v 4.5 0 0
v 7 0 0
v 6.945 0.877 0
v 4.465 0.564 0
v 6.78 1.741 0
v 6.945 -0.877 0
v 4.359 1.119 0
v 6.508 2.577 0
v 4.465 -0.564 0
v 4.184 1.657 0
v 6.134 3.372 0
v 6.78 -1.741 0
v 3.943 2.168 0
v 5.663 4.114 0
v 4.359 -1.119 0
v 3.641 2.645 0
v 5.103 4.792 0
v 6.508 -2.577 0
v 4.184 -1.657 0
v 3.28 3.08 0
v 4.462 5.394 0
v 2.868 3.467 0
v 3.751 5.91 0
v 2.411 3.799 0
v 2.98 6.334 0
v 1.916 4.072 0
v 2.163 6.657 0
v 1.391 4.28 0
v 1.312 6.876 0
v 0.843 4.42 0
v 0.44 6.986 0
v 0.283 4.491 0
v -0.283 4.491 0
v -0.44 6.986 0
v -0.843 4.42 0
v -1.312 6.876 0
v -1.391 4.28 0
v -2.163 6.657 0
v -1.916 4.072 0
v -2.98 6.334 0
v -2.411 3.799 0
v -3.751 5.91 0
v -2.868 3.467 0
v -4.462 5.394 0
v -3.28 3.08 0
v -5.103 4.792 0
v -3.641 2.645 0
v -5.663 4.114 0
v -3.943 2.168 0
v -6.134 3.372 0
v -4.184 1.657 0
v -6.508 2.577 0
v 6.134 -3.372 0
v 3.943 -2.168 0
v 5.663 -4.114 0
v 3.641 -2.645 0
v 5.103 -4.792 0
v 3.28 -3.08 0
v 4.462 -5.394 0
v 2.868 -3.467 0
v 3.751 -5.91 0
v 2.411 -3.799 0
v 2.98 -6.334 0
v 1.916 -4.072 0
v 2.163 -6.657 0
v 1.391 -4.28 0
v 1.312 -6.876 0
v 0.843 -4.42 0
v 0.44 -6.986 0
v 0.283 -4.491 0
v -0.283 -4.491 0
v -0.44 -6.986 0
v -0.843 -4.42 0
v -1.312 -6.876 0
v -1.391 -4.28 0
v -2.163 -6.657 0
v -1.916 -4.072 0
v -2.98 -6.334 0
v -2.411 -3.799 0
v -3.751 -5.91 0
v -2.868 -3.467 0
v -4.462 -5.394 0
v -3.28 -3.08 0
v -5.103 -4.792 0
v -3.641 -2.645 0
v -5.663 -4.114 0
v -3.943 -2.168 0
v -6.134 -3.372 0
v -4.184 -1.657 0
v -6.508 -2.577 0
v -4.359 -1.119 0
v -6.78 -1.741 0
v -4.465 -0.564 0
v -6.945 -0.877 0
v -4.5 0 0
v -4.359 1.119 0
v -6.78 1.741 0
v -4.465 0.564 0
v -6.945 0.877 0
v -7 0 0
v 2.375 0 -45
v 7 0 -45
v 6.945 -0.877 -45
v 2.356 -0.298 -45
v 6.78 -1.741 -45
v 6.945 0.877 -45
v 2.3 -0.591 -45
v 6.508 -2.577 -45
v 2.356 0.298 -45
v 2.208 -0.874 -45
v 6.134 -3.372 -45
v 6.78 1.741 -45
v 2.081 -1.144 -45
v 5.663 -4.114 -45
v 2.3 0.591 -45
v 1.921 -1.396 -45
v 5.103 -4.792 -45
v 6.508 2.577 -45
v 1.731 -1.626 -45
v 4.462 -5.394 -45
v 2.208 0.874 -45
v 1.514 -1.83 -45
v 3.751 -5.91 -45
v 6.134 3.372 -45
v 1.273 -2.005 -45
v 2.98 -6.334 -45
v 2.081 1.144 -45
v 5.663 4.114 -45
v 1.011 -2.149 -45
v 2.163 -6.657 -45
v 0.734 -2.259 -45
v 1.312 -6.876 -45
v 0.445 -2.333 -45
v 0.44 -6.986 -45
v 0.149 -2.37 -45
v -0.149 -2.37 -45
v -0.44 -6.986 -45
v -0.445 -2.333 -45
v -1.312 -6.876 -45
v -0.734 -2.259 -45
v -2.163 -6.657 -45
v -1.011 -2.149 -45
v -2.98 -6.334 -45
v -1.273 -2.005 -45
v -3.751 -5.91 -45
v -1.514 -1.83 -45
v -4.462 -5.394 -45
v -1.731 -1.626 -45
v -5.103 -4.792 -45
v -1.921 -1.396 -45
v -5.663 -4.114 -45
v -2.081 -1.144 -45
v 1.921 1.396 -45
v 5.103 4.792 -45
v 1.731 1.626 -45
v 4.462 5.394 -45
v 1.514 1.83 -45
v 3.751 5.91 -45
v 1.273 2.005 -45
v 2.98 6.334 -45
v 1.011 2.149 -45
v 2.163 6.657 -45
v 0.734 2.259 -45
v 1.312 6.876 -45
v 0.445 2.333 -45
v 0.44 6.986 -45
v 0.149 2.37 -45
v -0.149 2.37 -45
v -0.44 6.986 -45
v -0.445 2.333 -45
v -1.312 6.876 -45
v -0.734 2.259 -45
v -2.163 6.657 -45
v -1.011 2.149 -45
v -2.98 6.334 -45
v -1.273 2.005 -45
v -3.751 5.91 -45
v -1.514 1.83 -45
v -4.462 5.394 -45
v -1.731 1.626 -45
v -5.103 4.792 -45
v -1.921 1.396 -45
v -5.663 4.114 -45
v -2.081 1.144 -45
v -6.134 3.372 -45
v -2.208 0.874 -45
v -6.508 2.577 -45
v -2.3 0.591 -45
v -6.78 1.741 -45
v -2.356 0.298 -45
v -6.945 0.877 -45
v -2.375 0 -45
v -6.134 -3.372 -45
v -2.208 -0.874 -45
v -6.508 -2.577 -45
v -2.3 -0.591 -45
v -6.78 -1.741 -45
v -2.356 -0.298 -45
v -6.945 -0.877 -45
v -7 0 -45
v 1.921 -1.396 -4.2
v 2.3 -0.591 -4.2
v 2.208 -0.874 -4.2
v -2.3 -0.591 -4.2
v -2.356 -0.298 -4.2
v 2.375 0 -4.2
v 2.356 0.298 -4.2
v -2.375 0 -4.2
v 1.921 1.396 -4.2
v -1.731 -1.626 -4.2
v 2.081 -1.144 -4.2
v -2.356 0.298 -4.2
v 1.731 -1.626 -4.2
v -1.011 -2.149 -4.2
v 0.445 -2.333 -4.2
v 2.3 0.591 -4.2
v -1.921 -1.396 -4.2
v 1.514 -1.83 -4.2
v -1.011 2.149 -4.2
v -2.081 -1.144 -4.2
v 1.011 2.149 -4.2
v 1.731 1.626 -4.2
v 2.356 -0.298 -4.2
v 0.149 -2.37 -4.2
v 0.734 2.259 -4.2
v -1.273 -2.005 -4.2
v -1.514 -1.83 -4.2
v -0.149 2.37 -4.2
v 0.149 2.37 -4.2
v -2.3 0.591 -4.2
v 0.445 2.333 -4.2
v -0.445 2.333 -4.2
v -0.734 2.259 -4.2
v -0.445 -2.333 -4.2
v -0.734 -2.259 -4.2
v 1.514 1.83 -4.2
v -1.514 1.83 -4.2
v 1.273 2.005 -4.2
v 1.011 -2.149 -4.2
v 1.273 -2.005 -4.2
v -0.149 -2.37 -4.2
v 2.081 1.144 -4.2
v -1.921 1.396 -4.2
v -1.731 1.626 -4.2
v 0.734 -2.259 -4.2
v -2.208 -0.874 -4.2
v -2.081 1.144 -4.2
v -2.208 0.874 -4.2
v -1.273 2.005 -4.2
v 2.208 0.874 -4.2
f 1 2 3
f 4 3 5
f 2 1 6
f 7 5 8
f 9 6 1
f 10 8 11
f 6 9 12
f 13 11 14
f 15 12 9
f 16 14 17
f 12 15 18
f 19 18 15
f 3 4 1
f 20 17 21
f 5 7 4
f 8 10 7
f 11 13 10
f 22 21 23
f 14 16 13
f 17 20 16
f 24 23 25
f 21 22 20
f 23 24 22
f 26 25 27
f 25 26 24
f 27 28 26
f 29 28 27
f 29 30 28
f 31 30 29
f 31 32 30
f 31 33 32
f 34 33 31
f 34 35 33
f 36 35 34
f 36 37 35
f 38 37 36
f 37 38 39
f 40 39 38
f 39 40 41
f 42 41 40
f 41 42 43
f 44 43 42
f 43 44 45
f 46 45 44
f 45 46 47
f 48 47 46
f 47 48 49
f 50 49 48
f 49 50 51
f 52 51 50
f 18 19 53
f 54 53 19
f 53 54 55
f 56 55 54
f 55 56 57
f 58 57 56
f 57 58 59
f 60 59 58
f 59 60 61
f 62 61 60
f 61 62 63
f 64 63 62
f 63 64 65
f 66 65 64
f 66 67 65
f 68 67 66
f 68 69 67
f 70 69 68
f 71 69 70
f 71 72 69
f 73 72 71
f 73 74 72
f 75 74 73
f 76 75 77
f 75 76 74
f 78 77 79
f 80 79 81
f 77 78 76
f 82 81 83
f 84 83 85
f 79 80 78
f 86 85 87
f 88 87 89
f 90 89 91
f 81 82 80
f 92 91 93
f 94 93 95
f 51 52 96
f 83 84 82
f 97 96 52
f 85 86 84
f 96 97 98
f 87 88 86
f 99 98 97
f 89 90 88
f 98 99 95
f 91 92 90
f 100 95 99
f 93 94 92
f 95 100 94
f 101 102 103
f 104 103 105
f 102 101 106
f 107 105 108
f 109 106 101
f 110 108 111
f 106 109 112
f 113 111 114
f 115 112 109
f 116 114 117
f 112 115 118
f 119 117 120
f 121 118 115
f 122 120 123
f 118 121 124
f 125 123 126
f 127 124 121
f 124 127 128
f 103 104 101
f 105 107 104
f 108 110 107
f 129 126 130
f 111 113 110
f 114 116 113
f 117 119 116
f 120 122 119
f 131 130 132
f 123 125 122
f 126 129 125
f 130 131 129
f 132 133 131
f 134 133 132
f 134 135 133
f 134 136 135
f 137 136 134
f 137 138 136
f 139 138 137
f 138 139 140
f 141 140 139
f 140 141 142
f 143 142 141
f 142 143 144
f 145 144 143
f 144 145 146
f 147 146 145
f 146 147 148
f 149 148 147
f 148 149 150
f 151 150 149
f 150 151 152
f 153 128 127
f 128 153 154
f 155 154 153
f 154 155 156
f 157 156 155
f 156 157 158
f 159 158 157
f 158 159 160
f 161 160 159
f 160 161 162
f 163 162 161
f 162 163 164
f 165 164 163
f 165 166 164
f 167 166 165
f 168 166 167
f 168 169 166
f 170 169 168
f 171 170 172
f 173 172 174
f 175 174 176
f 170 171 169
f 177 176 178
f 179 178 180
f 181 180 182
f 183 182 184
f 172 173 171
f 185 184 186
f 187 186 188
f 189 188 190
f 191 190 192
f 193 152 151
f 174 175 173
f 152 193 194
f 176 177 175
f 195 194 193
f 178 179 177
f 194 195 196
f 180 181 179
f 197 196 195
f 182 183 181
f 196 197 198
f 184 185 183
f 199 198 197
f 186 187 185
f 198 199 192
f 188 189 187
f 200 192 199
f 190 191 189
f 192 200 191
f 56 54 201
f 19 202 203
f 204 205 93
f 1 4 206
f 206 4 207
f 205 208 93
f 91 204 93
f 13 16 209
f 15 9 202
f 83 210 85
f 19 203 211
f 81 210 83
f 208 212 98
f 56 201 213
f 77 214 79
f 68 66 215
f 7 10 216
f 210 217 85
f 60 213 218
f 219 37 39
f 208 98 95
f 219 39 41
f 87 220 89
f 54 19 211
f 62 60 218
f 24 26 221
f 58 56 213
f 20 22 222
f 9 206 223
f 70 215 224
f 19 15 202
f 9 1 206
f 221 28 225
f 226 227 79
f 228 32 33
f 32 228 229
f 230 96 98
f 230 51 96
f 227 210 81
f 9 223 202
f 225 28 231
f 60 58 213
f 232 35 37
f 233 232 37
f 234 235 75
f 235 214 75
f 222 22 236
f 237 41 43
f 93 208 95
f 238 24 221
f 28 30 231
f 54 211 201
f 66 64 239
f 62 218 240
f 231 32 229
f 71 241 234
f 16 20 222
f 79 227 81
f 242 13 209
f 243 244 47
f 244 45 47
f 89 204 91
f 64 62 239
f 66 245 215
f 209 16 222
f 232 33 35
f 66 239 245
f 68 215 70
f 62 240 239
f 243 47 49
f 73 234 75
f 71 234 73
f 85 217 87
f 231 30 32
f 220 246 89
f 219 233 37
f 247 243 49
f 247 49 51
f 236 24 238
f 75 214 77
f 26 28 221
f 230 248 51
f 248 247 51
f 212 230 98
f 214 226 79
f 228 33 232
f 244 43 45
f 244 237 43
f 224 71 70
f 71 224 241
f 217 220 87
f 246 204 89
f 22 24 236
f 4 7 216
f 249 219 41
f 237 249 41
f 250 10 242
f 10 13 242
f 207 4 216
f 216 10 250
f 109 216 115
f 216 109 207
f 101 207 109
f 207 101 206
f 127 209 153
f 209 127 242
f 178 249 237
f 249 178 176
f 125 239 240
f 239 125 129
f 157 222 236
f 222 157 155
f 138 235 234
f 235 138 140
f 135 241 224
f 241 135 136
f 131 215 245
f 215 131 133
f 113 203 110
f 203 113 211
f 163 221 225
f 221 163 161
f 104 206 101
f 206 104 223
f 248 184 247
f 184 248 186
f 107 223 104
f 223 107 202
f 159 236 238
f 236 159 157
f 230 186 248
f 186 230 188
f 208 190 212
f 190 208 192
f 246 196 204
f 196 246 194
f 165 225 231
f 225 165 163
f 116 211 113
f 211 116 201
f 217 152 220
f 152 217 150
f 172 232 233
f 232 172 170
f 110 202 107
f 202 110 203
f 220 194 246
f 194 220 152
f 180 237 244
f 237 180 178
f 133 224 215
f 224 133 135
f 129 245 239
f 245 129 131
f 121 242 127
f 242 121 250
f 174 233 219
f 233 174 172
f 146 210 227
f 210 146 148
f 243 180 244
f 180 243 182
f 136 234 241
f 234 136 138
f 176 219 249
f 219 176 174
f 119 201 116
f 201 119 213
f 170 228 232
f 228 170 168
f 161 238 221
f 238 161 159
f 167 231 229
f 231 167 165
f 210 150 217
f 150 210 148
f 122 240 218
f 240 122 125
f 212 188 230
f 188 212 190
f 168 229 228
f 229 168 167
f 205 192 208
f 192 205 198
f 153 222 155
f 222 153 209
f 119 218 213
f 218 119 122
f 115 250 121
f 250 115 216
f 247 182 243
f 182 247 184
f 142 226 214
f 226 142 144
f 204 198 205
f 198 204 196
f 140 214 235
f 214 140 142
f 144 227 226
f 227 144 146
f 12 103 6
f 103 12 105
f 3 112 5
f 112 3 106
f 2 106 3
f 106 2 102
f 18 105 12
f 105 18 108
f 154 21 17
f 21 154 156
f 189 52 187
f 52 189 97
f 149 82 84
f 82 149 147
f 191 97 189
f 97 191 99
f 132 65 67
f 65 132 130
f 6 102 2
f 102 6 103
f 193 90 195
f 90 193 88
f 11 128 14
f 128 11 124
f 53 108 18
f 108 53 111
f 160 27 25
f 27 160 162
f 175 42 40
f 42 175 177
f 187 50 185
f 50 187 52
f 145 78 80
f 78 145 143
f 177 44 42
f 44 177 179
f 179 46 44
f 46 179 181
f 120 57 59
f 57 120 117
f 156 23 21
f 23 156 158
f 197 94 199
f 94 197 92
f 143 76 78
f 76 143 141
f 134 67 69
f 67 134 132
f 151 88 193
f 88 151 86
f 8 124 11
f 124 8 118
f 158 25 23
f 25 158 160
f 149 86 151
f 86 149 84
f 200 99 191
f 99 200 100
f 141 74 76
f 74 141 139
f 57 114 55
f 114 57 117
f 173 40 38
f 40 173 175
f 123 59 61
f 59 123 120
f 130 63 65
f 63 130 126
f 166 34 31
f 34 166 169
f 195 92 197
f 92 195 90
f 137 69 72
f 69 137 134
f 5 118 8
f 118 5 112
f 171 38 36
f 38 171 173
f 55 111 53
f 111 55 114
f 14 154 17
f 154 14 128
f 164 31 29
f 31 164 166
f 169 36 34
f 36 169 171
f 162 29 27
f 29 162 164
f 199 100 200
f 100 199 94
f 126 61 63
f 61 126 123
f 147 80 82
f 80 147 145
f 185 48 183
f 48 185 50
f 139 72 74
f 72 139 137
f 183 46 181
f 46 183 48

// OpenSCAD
$fn = 50;


difference() {
	union() {
		translate(v = [0, 0, -45.0000000000]) {
			cylinder(h = 45, r = 7.0000000000);
		}
		cylinder(h = 0, r = 10.0000000000);
	}
	union() {
		translate(v = [0, 0, 0]) {
			rotate(a = [0, 0, 0]) {
				difference() {
					union() {
						#translate(v = [0, 0, -45.0000000000]) {
							cylinder(h = 45, r = 2.2500000000);
						}
						#translate(v = [0, 0, -4.2000000000]) {
							cylinder(h = 4.2000000000, r = 7.0000000000, r1 = 2.3750000000, r2 = 4.5000000000);
						}
						#translate(v = [0, 0, -45.0000000000]) {
							cylinder(h = 45, r = 2.3750000000);
						}
						#translate(v = [0, 0, -45.0000000000]) {
							cylinder(h = 45, r = 2.2500000000);
						}
					}
					union();
				}
			}
		}
	}
}
